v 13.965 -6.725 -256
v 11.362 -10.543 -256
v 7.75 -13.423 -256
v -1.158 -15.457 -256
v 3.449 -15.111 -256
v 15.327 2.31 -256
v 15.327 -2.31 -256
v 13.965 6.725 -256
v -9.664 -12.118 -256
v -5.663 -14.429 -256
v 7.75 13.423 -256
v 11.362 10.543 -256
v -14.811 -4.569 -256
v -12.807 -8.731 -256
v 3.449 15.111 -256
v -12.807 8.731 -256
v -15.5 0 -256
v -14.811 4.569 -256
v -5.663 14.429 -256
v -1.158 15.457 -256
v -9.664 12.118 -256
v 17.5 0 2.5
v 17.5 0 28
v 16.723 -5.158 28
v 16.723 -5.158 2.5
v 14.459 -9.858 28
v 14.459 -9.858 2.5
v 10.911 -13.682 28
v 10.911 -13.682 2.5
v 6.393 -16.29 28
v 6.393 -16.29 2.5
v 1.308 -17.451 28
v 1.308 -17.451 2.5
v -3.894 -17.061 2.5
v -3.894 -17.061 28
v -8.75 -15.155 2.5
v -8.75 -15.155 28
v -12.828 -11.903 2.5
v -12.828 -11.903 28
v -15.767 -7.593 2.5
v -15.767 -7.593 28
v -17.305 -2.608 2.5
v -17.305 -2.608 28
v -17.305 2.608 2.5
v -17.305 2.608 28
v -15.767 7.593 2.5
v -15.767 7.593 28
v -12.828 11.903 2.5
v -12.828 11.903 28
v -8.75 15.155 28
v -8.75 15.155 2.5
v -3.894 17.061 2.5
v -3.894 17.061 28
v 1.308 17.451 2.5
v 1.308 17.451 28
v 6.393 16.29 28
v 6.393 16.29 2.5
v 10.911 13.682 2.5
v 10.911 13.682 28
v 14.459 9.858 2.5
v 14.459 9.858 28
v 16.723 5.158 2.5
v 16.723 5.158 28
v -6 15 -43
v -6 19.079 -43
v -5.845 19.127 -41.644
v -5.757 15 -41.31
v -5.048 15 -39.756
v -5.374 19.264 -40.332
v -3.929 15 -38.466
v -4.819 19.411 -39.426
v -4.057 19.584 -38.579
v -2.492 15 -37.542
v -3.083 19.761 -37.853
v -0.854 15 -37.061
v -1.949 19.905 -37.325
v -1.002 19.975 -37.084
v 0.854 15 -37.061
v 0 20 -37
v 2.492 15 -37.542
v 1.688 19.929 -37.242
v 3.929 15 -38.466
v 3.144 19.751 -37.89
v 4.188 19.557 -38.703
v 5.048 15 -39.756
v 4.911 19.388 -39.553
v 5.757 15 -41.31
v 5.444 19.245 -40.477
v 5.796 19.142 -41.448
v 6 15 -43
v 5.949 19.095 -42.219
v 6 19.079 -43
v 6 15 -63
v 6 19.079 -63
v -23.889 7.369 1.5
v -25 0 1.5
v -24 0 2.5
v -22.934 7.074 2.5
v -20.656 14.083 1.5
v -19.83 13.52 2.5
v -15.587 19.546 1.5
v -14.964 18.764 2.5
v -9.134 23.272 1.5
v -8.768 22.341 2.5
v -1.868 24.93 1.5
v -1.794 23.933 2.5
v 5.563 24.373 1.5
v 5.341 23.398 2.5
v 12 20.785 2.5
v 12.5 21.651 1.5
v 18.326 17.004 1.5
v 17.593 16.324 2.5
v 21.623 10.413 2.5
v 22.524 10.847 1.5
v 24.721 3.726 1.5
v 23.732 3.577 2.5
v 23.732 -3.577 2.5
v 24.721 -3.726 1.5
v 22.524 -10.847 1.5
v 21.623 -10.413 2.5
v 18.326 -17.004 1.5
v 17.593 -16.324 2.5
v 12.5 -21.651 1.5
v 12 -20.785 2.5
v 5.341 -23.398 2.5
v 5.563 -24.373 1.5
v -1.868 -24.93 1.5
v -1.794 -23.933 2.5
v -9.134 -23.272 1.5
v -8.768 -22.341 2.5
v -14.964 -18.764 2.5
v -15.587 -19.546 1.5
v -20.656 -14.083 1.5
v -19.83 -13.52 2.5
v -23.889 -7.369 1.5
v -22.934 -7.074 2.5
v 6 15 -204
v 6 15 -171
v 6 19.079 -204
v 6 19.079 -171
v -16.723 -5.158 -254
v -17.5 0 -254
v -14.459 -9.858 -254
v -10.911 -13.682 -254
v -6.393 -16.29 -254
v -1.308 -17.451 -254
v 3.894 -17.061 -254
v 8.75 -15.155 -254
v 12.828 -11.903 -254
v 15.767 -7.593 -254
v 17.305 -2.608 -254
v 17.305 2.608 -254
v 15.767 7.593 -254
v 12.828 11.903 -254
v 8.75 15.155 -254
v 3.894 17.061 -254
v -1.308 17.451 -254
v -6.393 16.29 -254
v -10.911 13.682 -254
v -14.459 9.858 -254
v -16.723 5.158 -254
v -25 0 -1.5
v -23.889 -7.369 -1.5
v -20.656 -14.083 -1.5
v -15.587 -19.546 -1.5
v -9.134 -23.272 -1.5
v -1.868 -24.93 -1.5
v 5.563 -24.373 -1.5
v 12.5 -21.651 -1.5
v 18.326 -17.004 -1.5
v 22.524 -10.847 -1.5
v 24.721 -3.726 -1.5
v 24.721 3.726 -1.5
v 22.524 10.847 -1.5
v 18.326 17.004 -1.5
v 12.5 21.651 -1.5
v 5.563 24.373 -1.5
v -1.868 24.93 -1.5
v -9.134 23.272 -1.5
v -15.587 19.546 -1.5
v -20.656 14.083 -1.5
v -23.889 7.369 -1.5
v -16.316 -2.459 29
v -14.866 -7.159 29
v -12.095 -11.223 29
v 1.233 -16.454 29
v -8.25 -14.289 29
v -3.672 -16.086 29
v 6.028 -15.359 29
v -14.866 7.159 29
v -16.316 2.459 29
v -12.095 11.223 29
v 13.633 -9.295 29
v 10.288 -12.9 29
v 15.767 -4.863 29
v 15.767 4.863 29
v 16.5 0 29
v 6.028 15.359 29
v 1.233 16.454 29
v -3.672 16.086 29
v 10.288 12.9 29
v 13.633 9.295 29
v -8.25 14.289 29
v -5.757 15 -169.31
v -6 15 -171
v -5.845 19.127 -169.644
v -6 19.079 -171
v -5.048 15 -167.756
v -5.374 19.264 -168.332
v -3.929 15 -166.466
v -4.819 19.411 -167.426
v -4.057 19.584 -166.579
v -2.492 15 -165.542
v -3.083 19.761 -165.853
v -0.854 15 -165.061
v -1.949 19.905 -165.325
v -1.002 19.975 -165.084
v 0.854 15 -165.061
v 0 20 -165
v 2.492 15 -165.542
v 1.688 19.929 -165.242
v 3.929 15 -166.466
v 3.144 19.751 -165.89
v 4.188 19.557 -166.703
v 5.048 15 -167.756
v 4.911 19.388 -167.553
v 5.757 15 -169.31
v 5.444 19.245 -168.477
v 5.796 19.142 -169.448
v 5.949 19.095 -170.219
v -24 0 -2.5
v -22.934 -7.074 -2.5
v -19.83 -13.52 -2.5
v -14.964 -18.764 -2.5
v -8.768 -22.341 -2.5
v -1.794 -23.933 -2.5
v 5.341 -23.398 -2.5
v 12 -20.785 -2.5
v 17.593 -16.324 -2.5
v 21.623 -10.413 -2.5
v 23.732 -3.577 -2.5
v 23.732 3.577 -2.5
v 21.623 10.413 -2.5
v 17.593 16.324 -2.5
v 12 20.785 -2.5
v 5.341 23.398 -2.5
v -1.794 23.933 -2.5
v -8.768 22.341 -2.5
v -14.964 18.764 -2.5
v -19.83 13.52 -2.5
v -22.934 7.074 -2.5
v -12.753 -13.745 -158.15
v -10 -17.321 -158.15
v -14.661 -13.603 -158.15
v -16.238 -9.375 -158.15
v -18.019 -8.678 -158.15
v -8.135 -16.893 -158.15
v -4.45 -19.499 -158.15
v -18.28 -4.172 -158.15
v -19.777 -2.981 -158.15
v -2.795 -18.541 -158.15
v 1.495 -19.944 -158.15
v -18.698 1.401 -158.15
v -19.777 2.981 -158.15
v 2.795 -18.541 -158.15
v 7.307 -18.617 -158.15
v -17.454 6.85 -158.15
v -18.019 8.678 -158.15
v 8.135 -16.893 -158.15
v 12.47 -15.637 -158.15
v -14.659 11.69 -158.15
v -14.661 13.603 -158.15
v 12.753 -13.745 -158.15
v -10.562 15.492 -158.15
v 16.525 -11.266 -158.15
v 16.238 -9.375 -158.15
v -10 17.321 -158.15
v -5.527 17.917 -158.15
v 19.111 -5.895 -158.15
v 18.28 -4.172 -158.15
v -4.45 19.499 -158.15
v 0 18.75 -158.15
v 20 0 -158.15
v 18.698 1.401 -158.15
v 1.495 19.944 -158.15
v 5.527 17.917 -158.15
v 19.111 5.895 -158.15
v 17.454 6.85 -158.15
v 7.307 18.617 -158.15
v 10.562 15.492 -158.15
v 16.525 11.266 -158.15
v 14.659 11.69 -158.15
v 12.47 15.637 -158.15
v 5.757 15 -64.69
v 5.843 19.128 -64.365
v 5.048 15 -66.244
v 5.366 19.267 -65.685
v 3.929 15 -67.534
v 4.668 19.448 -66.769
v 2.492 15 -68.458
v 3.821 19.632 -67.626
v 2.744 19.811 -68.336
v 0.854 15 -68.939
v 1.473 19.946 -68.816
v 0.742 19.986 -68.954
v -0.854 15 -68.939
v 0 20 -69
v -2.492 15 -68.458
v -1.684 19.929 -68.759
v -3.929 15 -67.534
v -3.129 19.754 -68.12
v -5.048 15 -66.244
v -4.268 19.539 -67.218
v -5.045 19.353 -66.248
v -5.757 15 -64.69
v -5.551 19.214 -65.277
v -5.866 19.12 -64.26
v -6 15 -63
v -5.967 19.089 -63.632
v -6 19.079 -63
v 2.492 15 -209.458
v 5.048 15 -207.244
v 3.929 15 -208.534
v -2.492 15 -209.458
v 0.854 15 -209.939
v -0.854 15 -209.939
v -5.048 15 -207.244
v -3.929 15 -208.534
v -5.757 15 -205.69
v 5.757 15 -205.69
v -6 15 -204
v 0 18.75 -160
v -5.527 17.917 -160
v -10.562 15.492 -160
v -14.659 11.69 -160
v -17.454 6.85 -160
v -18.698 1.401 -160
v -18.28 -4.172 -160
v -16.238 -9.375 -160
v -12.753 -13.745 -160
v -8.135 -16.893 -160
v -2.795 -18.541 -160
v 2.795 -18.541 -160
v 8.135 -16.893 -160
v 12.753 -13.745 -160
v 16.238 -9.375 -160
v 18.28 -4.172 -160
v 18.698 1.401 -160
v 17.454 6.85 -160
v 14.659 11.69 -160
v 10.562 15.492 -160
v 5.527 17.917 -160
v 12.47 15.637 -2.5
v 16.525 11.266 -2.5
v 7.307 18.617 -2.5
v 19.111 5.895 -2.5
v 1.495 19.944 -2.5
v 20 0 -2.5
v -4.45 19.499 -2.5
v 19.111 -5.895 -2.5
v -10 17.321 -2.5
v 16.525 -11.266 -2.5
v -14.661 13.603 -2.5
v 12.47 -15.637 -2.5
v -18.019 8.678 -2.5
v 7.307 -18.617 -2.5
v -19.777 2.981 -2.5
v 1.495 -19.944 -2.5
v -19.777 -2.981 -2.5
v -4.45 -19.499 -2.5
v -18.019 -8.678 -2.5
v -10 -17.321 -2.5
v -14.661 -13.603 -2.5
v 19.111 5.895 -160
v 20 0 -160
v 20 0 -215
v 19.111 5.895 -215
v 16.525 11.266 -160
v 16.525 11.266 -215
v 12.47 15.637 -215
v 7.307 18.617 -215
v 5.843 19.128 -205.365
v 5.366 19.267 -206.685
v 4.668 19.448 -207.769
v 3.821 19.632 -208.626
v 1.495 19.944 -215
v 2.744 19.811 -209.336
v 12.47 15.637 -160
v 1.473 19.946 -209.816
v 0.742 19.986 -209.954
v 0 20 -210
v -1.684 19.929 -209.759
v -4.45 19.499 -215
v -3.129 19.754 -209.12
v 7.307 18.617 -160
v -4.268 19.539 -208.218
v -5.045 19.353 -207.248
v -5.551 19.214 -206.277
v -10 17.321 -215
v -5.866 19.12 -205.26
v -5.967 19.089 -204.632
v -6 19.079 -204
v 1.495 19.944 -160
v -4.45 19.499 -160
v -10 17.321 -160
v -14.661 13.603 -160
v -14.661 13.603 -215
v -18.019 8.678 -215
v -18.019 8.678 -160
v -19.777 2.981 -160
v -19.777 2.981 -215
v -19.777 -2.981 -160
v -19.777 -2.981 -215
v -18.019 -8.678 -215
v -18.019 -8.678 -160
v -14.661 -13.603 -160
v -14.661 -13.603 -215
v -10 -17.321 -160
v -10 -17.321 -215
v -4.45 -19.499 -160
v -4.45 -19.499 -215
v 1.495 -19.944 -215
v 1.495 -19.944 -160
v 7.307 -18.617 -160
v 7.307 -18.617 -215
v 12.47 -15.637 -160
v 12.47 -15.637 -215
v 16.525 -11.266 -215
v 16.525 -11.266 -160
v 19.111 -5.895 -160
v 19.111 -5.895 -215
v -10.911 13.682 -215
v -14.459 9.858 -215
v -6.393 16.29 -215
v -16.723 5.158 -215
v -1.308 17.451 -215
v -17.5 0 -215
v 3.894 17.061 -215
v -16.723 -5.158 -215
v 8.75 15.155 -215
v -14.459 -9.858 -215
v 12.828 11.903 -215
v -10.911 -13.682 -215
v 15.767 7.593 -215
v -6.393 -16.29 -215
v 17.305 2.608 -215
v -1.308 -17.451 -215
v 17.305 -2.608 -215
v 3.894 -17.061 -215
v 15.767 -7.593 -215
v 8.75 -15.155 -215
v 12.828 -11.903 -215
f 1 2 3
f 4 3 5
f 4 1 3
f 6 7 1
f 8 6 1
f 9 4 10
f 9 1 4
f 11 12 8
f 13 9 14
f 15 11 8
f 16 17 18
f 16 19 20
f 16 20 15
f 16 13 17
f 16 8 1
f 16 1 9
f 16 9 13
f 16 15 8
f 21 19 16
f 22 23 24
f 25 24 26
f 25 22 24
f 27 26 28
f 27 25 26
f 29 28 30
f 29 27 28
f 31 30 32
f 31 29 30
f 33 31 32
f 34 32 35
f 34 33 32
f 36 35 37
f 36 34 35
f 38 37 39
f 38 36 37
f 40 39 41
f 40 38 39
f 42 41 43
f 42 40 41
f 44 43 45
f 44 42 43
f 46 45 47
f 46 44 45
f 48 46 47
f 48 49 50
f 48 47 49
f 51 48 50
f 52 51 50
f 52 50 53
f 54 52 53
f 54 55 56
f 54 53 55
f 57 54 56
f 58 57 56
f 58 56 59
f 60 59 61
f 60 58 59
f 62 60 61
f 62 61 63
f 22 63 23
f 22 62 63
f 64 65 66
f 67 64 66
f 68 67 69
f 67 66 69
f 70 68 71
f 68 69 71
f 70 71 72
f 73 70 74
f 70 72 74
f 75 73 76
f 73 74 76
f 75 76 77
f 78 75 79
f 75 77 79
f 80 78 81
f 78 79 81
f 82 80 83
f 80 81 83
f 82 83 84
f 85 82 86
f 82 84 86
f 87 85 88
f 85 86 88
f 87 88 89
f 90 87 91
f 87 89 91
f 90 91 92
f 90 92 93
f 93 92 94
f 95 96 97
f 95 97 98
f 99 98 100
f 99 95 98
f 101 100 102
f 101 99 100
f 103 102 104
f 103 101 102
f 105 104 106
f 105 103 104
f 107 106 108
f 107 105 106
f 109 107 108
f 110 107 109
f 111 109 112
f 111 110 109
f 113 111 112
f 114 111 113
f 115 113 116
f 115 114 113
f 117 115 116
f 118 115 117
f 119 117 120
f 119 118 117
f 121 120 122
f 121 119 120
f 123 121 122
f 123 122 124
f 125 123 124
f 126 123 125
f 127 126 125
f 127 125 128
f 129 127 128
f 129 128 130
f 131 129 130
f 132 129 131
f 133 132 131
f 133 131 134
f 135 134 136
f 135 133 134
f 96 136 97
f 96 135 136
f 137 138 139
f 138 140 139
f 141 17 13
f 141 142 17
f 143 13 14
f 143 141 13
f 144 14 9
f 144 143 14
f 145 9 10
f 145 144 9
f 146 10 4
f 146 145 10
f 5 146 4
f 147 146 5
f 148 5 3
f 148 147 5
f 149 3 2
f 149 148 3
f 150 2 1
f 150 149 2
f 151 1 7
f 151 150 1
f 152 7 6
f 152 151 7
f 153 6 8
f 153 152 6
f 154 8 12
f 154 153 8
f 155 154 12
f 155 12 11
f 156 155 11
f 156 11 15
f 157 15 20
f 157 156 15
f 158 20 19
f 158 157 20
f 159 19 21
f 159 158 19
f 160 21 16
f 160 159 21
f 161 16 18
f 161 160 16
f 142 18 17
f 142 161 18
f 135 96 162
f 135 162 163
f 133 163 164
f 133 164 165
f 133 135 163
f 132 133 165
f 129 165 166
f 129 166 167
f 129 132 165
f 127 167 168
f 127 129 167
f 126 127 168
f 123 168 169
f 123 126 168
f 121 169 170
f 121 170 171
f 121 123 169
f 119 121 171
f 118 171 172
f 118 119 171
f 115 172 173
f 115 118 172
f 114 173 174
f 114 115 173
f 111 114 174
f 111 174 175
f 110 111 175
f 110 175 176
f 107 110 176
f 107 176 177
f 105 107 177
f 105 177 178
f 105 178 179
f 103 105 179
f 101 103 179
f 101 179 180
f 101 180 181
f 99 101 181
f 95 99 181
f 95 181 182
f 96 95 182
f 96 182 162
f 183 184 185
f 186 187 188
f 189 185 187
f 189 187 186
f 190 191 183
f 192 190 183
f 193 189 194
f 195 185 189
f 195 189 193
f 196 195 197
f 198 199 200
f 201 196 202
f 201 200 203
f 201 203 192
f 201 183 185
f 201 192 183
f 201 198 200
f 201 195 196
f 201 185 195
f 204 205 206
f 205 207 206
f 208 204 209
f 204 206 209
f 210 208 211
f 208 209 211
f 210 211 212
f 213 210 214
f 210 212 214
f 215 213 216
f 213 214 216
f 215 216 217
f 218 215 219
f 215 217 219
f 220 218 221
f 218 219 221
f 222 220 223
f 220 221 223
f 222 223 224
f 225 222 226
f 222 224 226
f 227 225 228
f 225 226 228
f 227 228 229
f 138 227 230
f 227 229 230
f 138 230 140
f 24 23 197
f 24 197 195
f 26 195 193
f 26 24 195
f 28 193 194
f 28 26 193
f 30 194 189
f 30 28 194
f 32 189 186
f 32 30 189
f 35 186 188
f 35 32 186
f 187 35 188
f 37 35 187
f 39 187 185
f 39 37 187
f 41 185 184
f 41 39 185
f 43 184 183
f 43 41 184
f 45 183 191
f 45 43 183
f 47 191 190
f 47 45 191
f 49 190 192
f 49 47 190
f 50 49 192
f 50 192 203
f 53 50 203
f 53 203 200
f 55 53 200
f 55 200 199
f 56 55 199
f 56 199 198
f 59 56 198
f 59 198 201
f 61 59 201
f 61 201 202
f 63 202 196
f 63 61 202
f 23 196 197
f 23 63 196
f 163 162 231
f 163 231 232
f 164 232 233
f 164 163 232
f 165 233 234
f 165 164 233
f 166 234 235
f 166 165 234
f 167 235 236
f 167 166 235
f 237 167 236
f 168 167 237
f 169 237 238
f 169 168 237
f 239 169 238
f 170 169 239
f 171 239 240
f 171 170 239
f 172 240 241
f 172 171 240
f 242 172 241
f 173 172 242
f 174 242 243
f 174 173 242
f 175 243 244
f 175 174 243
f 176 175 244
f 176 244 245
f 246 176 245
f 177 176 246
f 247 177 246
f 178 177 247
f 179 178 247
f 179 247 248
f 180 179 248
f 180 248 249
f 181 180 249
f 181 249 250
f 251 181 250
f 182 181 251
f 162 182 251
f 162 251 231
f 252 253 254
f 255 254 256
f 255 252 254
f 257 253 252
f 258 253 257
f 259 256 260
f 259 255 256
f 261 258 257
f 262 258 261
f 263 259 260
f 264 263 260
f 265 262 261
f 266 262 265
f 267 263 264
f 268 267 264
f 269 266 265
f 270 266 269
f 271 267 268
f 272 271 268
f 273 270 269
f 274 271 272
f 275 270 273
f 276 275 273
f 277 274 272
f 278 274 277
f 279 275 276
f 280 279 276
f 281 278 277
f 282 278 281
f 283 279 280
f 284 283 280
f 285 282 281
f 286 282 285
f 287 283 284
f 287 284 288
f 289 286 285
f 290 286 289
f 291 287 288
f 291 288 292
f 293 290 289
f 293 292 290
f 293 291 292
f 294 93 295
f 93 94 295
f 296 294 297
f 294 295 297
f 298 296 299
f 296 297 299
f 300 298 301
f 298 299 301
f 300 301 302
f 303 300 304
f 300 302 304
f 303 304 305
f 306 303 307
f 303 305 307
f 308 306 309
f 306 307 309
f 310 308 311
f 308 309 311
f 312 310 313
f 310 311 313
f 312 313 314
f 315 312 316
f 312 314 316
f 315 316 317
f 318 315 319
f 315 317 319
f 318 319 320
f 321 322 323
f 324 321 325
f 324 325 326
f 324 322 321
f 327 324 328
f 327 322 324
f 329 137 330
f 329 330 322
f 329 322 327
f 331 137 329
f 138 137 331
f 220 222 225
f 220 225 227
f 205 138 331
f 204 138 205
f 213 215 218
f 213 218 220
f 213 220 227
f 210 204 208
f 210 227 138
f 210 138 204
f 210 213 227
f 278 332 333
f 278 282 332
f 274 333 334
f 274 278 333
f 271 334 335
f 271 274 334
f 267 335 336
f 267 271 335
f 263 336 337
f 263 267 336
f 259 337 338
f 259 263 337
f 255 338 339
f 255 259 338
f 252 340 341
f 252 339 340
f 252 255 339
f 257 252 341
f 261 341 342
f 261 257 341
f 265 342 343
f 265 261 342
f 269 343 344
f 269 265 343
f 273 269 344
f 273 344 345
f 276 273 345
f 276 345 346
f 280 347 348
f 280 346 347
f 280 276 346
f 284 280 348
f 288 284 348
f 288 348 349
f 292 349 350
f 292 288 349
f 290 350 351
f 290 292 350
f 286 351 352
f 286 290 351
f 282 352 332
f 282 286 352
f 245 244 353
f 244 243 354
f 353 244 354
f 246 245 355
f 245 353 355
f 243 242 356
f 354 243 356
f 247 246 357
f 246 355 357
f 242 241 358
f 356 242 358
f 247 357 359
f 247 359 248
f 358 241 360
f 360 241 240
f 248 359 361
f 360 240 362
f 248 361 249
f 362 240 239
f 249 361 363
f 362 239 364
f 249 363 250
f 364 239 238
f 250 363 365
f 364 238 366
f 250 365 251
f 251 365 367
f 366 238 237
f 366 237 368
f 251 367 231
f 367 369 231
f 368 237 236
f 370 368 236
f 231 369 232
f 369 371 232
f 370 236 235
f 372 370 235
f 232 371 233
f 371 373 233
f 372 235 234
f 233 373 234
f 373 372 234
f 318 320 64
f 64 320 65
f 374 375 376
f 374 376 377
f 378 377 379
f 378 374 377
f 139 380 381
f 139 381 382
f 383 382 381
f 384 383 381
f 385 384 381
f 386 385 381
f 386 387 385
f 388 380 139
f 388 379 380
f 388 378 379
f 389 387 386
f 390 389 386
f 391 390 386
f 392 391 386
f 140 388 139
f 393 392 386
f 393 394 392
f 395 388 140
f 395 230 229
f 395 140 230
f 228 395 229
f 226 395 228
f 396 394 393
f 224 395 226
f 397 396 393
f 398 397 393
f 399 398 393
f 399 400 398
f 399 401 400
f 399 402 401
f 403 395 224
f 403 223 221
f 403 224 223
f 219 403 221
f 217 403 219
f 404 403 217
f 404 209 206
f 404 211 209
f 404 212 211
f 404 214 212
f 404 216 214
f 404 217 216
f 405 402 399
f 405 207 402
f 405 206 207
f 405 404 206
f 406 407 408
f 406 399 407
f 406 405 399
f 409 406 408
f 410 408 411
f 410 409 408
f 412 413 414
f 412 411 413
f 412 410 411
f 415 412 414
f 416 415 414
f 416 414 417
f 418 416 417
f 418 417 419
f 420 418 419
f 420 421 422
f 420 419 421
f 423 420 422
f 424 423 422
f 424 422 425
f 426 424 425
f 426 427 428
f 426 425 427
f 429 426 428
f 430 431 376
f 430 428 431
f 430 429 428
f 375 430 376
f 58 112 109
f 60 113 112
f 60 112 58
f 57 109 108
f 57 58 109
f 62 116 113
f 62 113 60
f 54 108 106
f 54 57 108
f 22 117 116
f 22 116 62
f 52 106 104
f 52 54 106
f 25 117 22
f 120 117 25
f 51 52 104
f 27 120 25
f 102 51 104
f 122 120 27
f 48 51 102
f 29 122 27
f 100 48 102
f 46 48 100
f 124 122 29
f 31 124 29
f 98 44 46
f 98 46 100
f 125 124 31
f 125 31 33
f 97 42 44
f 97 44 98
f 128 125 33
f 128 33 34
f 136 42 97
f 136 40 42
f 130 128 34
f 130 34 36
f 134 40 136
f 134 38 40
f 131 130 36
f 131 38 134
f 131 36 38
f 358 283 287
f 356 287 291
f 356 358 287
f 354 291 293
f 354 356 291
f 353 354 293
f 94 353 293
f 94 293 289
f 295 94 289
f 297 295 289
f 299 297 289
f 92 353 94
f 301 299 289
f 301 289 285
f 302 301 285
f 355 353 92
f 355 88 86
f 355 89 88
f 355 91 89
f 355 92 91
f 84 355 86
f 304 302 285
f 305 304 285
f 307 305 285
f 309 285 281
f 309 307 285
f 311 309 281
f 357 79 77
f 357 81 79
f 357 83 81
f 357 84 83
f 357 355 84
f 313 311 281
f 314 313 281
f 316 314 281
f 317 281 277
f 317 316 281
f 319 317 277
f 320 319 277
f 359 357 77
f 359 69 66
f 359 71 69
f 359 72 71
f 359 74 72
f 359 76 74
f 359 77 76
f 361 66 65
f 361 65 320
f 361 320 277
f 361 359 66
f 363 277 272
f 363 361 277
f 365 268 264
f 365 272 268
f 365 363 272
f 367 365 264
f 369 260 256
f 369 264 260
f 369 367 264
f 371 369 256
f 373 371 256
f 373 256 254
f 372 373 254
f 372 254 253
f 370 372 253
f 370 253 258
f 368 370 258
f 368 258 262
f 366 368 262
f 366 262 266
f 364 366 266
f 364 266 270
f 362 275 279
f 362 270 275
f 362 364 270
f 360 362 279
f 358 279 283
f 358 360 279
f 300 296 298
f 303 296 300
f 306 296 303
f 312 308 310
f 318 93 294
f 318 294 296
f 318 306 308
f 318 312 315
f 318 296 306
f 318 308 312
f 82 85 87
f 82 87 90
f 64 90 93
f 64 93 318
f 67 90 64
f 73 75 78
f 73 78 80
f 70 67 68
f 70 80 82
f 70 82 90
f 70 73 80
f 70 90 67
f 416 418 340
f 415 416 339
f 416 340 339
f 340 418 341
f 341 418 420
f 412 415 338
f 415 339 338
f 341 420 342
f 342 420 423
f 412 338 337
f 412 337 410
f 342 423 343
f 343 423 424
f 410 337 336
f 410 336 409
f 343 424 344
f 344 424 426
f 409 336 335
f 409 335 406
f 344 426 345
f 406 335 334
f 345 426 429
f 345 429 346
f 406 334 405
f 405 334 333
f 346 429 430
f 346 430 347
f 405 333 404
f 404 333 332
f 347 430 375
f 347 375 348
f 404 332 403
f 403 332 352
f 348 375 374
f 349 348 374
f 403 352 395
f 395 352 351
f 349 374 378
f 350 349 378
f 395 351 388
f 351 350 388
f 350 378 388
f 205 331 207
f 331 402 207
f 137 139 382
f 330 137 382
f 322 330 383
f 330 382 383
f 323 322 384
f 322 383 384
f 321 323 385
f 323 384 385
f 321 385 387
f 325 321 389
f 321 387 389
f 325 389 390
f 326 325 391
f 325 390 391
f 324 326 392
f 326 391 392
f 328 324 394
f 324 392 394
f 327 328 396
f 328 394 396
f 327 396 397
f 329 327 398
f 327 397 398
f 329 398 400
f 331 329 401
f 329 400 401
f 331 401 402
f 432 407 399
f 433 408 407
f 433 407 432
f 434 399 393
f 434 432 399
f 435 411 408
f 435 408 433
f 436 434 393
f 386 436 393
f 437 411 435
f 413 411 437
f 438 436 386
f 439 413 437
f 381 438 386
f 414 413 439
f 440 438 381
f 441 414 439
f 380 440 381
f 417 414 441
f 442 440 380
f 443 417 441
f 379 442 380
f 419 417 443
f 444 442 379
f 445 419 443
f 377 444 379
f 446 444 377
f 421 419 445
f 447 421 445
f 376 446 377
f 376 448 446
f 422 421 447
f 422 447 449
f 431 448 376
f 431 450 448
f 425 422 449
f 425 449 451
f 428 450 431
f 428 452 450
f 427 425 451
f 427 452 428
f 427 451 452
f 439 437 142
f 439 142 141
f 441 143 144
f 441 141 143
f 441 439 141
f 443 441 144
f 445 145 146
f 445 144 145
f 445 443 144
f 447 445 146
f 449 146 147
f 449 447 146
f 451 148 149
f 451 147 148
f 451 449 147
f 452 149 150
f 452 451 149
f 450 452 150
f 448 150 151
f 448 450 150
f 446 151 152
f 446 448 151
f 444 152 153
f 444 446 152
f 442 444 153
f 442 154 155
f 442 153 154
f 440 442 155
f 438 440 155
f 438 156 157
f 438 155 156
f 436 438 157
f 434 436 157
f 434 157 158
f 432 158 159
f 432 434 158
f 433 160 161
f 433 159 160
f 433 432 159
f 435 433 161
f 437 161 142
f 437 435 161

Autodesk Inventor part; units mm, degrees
ref_plane "YZ Plane" through (0, 0, 0) normal (1, 0, 0) x (0, 1, 0)
ref_plane "XY Plane" through (0, 0, 0) normal (0, 0, 1) x (1, 0, 0)
sketch "Esboço1" plane through (0, 0, 0) normal (0, 0, 1) x (-1, 0, 0)
  circle A0 centre (0, 0) radius 25
  dimension "d0" = 50
extrude "Extrusão1" add sketch "Esboço1" along normal mid plane 5
sketch "Esboço2" plane through (0, 0, 0) normal (0, 0, -1) x (1, 0, 0)
  circle A0 centre (0, 0) radius 20
  dimension "d3" = 40
extrude "Extrusão2" add sketch "Esboço2" along normal blind 215
sketch "Esboço3" plane through (0, 0, 0) normal (0, 0, 1) x (1, 0, 0)
  circle A0 centre (0, 0) radius 17.5
  dimension "d6" = 35
extrude "Extrusão3" add sketch "Esboço3" along normal blind 29
chamfer "Chanfro2" distance 1 angle 45 3 edges at (25, 0, -2.5) (25, 0, 2.5) (-17.5, 0, 29)
ref_plane "Plano de trabalho2" through (0, 20, 0) normal (0, 1, 0) x (-1, 0, 0)
sketch "Esboço7" plane through (0, 20, 0) normal (0, 1, 0) x (-1, 0, 0)
  line L0 (0, -63) -> (0, -43) construction
  line L1 (6, -63) -> (6, -43)
  line L2 (-6, -43) -> (-6, -63)
  arc A0 (-6, -63) -> (6, -63) centre (0, -63) ccw
  arc A1 (6, -43) -> (-6, -43) centre (0, -43) ccw
  line L3 (24, -2.5) -> (-24, -2.5) projected
  point P0 (0, 0)
  point P1 (0, -53)
  dimension "d25" = 12
  dimension "d26" = 20
  dimension "d27" = 40.5
extrude "Extrusão6" cut sketch "Esboço7" against normal blind 5
sketch "Esboço8" plane through (0, 0, -215) normal (0, 0, -1) x (-1, 0, 0)
  circle A0 centre (0, 0) radius 20 projected
  circle A1 centre (0, 0) radius 17.5
  dimension "d30" = 35
extrude "Extrusão7" add sketch "Esboço8" along normal blind 3 contours A1
sketch "Esboço9" plane through (0, 0, -218) normal (0, 0, -1) x (-1, 0, 0)
  circle A0 centre (0, 0) radius 17.5 projected
  circle A1 centre (0, 0) radius 19.5
  dimension "d33" = 39
extrude "Extrusão8" add sketch "Esboço9" along normal blind 38 contours A0
chamfer "Chanfro3" distance 2 angle 45 1 edges at (17.5, 0, -256)
thread "Rosca1" size "M39x4" class "6g" standard "ANSI Metric M Profile" full length
sketch "Esboço10" plane through (0, 0, 0) normal (1, 0, 0) x (0, 1, 0)
  line L0 (20, -2.5) -> (20, -215) projected
  line L1 (20, -160) -> (18.75, -160)
  line L2 (18.75, -160) -> (18.75, -158.15)
  line L3 (18.75, -158.15) -> (20, -158.15)
  line L4 (20, -158.15) -> (20, -160)
  line L5 (0, 0) -> (0, -179.7731)
  dimension "d41" = 1.85
  dimension "d42" = 160
  dimension "d43" = 37.5
revolve "Revolução1" cut sketch "Esboço10" angle 360 about axis through (0, 0, 0) along (0, 0, -1)
sketch "Esboço11" plane through (0, 20, 0) normal (0, 1, 0) x (-1, 0, 0)
  line L0 (0, -204) -> (0, -171) construction
  line L1 (6, -204) -> (6, -171)
  line L2 (-6, -171) -> (-6, -204)
  arc A0 (-6, -204) -> (6, -204) centre (0, -204) ccw
  arc A1 (6, -171) -> (-6, -171) centre (0, -171) ccw
  point P0 (0, 0)
  point P1 (0, -187.5)
  dimension "d45" = 171
  dimension "d46" = 33
  dimension "d47" = 6
extrude "Extrusão9" cut sketch "Esboço11" against normal blind 5
properties material "Liga de aço"
